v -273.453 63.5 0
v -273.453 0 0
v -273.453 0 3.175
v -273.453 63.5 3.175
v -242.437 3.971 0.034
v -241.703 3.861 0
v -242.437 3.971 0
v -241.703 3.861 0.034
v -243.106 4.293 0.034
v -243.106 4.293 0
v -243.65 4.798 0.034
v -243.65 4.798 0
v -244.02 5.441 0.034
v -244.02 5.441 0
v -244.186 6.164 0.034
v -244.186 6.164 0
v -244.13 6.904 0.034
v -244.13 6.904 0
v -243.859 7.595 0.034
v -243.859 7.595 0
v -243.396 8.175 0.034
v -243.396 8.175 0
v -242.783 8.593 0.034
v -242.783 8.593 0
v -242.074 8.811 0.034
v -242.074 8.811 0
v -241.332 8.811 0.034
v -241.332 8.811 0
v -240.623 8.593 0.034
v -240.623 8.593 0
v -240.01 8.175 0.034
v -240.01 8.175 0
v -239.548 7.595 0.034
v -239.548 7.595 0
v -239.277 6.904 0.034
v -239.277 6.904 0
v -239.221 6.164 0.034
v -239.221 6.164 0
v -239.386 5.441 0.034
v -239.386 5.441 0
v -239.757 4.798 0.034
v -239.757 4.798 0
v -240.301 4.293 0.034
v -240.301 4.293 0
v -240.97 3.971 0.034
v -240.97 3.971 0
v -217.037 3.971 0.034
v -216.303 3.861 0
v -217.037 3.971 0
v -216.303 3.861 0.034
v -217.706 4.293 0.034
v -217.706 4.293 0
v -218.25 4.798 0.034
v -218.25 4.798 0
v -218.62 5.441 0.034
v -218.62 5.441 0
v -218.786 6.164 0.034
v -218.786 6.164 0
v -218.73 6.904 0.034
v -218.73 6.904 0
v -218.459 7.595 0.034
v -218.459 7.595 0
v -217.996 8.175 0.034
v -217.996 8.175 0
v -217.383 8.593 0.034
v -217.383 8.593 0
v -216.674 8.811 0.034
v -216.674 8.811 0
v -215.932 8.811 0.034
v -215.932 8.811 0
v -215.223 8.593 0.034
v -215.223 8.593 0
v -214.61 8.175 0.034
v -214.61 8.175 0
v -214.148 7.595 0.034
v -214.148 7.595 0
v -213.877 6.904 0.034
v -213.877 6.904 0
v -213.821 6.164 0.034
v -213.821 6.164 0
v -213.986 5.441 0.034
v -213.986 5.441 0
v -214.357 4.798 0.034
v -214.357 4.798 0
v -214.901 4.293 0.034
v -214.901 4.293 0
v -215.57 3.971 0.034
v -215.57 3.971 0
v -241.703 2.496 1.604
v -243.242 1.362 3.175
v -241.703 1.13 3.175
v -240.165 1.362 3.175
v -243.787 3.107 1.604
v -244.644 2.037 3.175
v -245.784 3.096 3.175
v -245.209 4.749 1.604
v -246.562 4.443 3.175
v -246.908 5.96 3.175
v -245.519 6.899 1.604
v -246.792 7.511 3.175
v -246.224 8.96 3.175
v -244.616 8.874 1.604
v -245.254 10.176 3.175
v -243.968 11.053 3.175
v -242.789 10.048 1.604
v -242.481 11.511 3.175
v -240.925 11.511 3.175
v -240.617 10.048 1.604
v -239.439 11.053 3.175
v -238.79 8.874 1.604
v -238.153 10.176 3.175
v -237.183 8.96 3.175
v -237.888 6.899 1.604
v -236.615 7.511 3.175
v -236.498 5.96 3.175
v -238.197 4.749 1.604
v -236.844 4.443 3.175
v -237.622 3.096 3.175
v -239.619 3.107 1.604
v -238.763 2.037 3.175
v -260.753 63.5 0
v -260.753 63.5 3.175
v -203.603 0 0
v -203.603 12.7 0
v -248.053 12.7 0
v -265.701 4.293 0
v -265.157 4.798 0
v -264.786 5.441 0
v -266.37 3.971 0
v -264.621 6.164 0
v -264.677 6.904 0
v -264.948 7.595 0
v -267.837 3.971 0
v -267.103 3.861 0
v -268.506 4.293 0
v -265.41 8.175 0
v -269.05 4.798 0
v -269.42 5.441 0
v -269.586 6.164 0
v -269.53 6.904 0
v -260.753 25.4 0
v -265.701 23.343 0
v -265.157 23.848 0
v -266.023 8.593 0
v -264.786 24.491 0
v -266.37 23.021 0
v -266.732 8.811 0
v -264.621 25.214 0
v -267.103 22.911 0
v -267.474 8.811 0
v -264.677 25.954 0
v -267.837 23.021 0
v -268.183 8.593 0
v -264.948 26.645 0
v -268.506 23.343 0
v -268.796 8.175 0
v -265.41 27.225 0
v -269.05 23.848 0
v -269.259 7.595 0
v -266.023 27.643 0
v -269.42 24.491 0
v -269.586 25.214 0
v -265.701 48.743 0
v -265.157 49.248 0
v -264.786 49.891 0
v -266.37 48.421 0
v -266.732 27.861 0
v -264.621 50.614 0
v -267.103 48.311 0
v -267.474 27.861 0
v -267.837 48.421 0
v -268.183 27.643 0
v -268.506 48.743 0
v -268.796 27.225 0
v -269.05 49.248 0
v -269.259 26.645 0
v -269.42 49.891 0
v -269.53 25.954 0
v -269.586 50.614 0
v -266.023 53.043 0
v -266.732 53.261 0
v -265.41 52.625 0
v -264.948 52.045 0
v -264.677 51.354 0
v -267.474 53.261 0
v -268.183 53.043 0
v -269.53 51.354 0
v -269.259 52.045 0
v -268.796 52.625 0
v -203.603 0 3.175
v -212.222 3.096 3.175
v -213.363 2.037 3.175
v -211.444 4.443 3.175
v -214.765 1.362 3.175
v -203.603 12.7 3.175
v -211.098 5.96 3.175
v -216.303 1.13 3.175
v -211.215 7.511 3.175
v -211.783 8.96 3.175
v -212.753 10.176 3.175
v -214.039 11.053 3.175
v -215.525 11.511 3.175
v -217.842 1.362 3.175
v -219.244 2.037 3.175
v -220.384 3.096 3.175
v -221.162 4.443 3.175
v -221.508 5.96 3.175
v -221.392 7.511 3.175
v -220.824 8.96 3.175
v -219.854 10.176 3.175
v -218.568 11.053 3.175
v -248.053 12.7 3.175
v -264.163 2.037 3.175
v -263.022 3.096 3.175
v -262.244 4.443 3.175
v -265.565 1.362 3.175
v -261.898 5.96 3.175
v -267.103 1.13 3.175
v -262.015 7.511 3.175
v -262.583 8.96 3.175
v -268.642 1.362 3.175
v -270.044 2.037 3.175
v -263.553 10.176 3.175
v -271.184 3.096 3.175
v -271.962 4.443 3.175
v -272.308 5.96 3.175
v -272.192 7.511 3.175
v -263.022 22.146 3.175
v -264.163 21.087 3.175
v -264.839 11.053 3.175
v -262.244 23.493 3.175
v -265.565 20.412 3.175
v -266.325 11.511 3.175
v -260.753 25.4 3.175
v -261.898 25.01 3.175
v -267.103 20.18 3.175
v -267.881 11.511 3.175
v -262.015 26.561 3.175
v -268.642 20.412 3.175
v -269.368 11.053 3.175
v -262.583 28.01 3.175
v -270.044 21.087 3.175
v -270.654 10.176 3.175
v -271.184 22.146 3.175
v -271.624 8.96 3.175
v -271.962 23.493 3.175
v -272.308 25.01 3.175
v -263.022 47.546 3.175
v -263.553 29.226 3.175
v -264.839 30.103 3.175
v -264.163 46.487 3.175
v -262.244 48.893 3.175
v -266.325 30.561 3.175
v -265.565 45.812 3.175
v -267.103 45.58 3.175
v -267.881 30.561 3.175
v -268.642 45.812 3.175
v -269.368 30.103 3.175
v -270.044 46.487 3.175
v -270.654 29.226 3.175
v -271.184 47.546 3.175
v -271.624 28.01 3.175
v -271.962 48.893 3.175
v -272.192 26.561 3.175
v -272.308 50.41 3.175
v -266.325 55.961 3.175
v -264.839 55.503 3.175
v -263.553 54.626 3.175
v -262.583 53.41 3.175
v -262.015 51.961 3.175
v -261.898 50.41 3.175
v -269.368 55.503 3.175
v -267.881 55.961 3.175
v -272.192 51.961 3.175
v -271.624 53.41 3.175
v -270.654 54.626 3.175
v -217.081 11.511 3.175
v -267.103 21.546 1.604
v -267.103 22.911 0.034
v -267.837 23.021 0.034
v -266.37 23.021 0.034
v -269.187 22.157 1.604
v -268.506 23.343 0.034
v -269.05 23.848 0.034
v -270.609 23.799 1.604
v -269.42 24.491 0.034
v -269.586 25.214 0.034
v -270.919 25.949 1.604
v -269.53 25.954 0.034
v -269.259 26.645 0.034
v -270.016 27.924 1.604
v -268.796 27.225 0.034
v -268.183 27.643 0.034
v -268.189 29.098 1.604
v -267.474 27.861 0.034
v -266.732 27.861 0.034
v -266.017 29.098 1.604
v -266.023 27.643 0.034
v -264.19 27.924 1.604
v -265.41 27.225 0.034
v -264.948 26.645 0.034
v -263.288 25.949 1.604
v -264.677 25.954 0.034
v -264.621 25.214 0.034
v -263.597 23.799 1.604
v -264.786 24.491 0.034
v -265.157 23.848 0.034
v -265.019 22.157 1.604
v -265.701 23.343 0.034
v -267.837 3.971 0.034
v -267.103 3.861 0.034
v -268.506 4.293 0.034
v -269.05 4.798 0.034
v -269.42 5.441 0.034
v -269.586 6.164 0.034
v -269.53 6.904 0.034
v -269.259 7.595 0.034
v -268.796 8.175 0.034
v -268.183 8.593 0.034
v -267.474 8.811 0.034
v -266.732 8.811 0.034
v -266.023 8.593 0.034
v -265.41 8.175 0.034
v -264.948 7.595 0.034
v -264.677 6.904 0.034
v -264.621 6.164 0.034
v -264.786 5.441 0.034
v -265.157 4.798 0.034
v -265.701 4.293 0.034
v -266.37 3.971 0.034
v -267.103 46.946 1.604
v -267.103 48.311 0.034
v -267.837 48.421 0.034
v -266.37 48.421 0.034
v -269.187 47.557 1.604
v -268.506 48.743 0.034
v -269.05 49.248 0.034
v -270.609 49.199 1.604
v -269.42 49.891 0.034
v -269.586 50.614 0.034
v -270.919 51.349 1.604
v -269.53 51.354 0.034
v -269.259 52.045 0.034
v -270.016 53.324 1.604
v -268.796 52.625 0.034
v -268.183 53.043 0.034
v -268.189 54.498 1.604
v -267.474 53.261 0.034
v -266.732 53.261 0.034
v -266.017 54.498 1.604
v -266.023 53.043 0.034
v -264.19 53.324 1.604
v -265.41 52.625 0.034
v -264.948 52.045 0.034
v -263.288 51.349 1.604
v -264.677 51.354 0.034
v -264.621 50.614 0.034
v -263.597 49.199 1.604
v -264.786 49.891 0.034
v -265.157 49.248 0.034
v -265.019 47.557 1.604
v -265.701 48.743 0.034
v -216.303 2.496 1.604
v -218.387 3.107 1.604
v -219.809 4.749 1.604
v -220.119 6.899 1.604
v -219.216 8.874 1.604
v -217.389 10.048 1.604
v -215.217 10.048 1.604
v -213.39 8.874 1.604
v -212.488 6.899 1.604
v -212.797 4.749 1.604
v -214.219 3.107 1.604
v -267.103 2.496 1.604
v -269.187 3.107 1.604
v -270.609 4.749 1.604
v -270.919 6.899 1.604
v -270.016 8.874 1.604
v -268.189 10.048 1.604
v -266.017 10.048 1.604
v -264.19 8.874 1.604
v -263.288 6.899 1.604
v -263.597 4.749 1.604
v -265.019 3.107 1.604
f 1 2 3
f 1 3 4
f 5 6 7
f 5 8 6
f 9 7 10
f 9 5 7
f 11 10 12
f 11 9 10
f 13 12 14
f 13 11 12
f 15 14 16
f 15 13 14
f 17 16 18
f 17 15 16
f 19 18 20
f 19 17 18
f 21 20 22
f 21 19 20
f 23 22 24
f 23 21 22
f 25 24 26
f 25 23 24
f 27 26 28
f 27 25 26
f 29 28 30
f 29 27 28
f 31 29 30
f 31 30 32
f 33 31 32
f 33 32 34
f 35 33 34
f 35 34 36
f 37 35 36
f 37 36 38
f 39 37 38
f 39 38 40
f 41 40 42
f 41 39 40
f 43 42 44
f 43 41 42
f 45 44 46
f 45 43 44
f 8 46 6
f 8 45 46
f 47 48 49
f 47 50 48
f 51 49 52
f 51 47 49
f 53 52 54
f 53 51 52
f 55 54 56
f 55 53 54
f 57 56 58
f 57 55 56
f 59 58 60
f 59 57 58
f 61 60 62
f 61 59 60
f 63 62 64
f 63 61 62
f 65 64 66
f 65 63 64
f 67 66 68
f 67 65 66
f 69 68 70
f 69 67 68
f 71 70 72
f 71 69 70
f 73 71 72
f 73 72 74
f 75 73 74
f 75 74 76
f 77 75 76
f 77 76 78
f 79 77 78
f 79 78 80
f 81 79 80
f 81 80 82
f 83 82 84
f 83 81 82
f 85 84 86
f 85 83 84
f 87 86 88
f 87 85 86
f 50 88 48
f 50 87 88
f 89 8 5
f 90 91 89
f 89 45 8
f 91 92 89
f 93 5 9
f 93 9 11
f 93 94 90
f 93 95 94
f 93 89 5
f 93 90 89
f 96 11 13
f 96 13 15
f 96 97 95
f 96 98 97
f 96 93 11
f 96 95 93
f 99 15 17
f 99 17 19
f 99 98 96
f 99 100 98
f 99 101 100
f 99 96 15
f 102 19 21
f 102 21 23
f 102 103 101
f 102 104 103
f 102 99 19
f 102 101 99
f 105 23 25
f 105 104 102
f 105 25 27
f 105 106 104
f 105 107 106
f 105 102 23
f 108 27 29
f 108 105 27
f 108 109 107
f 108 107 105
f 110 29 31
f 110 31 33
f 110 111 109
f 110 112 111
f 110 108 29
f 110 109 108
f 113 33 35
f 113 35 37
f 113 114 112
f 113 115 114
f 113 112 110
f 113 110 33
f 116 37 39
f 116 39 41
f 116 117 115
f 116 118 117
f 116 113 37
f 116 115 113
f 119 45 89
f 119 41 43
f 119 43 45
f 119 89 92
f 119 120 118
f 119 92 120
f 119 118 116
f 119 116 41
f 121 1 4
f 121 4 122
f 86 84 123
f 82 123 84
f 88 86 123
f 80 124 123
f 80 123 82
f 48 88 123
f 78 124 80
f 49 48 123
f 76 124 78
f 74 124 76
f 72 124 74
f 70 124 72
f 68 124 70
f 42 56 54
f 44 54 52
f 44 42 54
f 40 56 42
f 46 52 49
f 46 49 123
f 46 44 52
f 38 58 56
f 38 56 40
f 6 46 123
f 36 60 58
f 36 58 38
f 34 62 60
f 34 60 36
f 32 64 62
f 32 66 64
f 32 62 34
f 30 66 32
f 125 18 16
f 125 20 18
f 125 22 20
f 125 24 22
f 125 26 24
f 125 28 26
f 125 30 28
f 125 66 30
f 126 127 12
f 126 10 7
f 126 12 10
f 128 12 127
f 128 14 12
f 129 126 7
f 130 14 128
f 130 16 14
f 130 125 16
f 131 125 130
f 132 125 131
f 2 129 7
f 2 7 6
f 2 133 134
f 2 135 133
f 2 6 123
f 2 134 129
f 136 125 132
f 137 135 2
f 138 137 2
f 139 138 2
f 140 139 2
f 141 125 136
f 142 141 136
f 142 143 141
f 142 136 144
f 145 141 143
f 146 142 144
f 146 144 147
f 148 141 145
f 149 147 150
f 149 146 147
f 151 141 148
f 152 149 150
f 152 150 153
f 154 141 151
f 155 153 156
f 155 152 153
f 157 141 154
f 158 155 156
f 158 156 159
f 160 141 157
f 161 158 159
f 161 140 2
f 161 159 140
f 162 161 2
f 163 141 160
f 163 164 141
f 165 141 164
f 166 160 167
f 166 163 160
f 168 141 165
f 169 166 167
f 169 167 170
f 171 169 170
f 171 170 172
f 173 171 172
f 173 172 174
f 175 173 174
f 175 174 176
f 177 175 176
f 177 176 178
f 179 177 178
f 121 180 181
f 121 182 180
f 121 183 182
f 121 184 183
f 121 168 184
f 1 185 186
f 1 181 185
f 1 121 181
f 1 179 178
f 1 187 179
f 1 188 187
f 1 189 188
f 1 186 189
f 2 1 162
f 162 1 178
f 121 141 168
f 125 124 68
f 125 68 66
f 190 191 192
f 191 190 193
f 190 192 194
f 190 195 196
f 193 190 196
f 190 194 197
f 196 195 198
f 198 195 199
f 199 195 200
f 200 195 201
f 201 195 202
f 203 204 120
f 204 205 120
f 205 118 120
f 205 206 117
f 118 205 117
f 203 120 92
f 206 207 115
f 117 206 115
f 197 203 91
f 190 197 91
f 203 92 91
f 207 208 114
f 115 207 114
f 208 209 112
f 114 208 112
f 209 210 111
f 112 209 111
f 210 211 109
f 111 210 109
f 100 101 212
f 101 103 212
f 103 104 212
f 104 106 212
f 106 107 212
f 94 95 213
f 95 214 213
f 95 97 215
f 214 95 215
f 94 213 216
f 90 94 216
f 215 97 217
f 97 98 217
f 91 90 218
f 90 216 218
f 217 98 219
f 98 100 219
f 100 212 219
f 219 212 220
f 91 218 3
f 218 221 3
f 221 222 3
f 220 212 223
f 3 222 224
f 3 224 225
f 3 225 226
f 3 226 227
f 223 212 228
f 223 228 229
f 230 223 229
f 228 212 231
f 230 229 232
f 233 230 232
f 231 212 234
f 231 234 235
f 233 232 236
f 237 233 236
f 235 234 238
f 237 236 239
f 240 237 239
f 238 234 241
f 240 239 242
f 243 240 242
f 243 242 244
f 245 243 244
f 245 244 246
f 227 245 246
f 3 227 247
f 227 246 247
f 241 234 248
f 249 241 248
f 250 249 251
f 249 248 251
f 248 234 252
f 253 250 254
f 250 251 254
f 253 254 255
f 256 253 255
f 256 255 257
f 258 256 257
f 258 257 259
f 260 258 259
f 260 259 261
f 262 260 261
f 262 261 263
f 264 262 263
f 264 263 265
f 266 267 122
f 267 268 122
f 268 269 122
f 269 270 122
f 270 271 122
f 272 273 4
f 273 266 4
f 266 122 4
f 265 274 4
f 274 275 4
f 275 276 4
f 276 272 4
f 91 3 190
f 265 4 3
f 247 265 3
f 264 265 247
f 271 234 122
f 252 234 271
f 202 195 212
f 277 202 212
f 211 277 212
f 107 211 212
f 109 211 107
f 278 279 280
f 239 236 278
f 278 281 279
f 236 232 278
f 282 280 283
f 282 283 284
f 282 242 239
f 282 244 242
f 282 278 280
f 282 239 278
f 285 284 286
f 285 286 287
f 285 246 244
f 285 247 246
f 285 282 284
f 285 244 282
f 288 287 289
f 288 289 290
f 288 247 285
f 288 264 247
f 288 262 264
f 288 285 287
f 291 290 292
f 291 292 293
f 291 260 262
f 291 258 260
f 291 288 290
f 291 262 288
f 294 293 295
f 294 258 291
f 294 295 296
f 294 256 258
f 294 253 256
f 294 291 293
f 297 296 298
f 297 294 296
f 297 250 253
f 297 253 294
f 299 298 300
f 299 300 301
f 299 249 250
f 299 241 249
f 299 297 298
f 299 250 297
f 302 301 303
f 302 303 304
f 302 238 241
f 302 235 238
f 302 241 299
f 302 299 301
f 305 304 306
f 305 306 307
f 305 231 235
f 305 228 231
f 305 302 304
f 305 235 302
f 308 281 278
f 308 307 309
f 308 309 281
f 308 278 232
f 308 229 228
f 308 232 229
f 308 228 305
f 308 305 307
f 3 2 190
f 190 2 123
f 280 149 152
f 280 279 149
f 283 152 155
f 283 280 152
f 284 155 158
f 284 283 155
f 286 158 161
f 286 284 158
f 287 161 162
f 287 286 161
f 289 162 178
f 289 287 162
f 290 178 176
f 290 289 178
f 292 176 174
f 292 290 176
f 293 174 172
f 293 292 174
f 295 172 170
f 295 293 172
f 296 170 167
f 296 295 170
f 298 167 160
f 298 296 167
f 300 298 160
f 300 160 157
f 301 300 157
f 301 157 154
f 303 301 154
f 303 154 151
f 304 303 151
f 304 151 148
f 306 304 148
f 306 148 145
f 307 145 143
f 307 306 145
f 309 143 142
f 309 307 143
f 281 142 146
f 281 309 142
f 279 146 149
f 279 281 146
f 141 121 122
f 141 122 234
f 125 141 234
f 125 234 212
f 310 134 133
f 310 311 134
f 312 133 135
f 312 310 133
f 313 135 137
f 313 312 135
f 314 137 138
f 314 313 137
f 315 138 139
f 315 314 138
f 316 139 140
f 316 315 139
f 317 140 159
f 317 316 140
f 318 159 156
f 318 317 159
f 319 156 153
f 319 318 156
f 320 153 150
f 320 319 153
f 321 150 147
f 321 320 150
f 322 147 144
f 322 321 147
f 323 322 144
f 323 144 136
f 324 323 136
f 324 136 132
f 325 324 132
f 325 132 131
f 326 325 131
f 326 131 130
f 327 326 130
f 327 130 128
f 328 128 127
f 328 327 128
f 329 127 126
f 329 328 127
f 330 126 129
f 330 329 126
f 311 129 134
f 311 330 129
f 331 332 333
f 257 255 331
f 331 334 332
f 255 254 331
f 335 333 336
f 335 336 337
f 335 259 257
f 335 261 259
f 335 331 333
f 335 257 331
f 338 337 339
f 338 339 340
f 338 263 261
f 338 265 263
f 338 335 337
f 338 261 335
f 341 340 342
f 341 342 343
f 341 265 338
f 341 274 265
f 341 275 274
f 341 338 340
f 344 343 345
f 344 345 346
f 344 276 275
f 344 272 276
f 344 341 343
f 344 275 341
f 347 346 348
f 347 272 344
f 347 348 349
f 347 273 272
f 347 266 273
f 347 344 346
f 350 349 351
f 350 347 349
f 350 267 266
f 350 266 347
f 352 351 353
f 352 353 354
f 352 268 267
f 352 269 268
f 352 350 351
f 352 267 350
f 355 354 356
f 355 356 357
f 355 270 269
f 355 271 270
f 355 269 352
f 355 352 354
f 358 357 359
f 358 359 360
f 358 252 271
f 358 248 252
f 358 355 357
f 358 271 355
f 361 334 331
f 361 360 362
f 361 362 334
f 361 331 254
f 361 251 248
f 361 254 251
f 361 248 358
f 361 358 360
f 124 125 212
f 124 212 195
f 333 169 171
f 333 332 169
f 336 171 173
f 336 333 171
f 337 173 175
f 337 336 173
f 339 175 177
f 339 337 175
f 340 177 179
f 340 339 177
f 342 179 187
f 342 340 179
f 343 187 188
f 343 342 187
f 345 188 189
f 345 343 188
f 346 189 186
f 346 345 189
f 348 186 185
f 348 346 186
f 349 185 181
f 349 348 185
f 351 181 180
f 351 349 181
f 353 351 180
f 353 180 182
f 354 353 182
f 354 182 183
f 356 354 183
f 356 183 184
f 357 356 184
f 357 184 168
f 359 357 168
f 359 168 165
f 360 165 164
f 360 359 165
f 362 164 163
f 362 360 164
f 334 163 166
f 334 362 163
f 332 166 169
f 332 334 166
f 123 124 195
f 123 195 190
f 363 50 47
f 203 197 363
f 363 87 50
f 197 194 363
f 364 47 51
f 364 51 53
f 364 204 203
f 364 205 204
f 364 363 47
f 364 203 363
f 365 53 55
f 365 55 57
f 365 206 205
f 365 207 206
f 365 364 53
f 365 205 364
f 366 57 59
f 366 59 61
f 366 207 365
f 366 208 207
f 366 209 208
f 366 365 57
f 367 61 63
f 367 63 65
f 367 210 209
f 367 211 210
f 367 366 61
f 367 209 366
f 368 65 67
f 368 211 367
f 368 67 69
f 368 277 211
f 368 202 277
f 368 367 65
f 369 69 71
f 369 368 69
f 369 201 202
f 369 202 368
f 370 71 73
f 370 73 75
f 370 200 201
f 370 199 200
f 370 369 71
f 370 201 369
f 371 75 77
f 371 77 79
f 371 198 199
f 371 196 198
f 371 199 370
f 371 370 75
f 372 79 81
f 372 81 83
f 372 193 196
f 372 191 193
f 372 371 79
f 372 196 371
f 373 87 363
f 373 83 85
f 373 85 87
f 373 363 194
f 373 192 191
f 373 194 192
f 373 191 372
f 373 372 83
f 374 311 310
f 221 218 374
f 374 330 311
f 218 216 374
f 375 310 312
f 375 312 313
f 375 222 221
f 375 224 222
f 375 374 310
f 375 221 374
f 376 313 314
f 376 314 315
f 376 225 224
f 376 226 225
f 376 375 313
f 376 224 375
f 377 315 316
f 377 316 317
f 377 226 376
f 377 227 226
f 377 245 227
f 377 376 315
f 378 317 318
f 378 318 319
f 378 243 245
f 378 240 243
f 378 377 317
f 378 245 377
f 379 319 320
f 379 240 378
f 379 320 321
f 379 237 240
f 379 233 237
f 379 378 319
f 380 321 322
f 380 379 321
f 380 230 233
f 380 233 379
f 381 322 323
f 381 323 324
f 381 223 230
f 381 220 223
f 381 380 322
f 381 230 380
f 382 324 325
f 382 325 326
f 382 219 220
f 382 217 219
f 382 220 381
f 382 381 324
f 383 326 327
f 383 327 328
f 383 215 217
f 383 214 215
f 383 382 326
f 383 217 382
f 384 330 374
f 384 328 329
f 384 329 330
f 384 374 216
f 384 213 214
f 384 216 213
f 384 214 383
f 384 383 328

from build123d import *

# Parameters (mm, degrees)
BOSS_EXTRUDE1_DEPTH             = 3.175
F_10_CLEARANCE_HOLE1_AT_2_COUNT = 2
F_10_CLEARANCE_HOLE1_AT_2_PITCH = 19.05
F_10_CLEARANCE_HOLE1_AT_3_COUNT = 2
F_10_CLEARANCE_HOLE1_AT_3_PITCH = 44.45
F_10_CLEARANCE_HOLE1_AT_4_COUNT = 2
F_10_CLEARANCE_HOLE1_AT_4_PITCH = 25.4
F_10_CLEARANCE_HOLE1_AT_5_COUNT = 2
F_10_CLEARANCE_HOLE1_AT_5_PITCH = 50.8


with BuildPart() as part:
    # Sketch1 → Boss-Extrude1 (new body)
    with BuildSketch(Plane.XY):
        Polygon((-260.753367516, 0), (-273.453367516, 0), (-273.453367516, 63.5), (-260.753367516, 63.5), (-260.753367516, 25.4), (-248.053367516, 12.7), (-203.603367516, 12.7), (-203.603367516, 0), align=None)
    extrude(amount=BOSS_EXTRUDE1_DEPTH)

    # Sketch4 → #10 Clearance Hole1 (revolve, cut)
    with BuildSketch(Plane(origin=(-267.103367516, 6.35, 3.175), x_dir=(0, -1, 0), z_dir=(1, 0, 0))):
        Polygon((0, 0), (0, 3.175), (2.4892, 3.175), (2.4892, 3.141080936), (5.2197, 0), align=None)
    f_10_clearance_hole1 = revolve(axis=Axis((-267.103367516, 6.35, 9.525), (0, 0, -1)), mode=Mode.SUBTRACT)

    # #10 Clearance Hole1 at 2: #10 Clearance Hole1 ×2
    with Locations(*[(0, i * F_10_CLEARANCE_HOLE1_AT_2_PITCH, 0) for i in range(1, F_10_CLEARANCE_HOLE1_AT_2_COUNT)]):
        add(f_10_clearance_hole1, mode=Mode.SUBTRACT)

    # #10 Clearance Hole1 at 3: #10 Clearance Hole1 ×2
    with Locations(*[(0, i * F_10_CLEARANCE_HOLE1_AT_3_PITCH, 0) for i in range(1, F_10_CLEARANCE_HOLE1_AT_3_COUNT)]):
        add(f_10_clearance_hole1, mode=Mode.SUBTRACT)

    # #10 Clearance Hole1 at 4: #10 Clearance Hole1 ×2
    with Locations(*[(i * F_10_CLEARANCE_HOLE1_AT_4_PITCH, 0, 0) for i in range(1, F_10_CLEARANCE_HOLE1_AT_4_COUNT)]):
        add(f_10_clearance_hole1, mode=Mode.SUBTRACT)

    # #10 Clearance Hole1 at 5: #10 Clearance Hole1 ×2
    with Locations(*[(i * F_10_CLEARANCE_HOLE1_AT_5_PITCH, 0, 0) for i in range(1, F_10_CLEARANCE_HOLE1_AT_5_COUNT)]):
        add(f_10_clearance_hole1, mode=Mode.SUBTRACT)


solid = part.part
